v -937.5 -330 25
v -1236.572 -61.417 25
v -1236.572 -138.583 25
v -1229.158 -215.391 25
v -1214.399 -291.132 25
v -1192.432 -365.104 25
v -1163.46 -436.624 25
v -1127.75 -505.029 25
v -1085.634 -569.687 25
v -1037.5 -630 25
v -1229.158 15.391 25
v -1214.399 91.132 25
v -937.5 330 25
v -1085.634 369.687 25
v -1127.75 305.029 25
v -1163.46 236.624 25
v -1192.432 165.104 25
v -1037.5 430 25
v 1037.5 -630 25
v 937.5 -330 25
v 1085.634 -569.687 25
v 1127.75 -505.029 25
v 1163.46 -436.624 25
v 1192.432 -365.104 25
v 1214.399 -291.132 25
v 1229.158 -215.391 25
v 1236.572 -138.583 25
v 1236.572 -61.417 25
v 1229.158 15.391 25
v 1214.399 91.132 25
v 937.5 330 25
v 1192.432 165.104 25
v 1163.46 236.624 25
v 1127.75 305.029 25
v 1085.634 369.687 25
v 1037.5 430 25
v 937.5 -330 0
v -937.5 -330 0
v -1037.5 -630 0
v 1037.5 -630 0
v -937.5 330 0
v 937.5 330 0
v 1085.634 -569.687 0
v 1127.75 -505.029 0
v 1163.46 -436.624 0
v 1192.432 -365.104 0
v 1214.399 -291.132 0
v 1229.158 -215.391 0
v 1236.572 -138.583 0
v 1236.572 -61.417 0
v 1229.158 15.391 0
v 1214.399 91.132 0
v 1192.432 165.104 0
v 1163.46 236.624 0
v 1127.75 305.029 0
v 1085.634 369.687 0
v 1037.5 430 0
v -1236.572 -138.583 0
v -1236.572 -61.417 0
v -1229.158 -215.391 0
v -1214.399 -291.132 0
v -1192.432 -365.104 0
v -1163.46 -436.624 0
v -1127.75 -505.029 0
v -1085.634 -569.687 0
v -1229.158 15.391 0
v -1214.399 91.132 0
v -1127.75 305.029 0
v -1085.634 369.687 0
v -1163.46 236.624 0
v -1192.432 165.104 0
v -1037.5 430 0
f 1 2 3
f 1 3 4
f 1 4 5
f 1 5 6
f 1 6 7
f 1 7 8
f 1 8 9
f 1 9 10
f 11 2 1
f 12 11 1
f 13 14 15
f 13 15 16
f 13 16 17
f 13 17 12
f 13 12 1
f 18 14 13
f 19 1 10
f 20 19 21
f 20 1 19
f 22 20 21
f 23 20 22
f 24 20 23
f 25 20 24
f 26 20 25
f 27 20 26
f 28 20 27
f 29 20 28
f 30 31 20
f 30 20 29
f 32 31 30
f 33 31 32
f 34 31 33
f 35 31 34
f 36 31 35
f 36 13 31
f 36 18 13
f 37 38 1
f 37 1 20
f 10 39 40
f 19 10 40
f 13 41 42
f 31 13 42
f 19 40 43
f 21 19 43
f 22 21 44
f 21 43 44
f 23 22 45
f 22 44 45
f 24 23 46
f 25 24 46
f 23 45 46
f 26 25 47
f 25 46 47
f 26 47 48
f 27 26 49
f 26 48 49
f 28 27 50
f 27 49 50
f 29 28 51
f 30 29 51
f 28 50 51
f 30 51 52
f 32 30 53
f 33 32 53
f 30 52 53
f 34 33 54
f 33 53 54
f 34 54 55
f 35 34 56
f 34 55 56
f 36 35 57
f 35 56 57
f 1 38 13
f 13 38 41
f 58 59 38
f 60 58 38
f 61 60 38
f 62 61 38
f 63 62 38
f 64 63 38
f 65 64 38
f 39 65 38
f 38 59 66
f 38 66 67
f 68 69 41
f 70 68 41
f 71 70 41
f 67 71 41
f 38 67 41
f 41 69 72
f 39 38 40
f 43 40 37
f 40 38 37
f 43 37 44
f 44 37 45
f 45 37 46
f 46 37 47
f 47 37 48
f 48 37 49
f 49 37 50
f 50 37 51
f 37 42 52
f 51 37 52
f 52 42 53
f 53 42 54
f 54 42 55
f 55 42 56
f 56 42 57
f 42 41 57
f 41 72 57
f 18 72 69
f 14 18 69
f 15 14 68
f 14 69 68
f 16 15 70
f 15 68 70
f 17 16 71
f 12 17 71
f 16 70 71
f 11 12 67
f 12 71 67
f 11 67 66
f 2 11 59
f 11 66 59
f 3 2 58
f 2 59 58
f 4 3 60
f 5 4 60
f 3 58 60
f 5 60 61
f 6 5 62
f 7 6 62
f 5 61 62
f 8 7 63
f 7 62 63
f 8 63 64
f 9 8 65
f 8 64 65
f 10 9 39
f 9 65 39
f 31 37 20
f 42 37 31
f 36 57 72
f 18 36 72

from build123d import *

# Parameters (mm, degrees)
F0_W     = 1875
F0_H     = 660
F1_DEPTH = 25


with BuildPart() as f1:
    # F0 (on Top) → F1 (new body)
    with BuildSketch(Plane.XY):
        with BuildLine():
            Line((1037.5, 430), (-1037.5, 430))
            ThreePointArc((-1037.5, 430), (-1237.5, -100), (-1037.5, -630))
            Line((-1037.5, -630), (1037.5, -630))
            ThreePointArc((1037.5, -630), (1237.5, -100), (1037.5, 430))
        make_face()
        Rectangle(F0_W, F0_H, mode=Mode.SUBTRACT)
    extrude(amount=F1_DEPTH)


solid = f1.part
